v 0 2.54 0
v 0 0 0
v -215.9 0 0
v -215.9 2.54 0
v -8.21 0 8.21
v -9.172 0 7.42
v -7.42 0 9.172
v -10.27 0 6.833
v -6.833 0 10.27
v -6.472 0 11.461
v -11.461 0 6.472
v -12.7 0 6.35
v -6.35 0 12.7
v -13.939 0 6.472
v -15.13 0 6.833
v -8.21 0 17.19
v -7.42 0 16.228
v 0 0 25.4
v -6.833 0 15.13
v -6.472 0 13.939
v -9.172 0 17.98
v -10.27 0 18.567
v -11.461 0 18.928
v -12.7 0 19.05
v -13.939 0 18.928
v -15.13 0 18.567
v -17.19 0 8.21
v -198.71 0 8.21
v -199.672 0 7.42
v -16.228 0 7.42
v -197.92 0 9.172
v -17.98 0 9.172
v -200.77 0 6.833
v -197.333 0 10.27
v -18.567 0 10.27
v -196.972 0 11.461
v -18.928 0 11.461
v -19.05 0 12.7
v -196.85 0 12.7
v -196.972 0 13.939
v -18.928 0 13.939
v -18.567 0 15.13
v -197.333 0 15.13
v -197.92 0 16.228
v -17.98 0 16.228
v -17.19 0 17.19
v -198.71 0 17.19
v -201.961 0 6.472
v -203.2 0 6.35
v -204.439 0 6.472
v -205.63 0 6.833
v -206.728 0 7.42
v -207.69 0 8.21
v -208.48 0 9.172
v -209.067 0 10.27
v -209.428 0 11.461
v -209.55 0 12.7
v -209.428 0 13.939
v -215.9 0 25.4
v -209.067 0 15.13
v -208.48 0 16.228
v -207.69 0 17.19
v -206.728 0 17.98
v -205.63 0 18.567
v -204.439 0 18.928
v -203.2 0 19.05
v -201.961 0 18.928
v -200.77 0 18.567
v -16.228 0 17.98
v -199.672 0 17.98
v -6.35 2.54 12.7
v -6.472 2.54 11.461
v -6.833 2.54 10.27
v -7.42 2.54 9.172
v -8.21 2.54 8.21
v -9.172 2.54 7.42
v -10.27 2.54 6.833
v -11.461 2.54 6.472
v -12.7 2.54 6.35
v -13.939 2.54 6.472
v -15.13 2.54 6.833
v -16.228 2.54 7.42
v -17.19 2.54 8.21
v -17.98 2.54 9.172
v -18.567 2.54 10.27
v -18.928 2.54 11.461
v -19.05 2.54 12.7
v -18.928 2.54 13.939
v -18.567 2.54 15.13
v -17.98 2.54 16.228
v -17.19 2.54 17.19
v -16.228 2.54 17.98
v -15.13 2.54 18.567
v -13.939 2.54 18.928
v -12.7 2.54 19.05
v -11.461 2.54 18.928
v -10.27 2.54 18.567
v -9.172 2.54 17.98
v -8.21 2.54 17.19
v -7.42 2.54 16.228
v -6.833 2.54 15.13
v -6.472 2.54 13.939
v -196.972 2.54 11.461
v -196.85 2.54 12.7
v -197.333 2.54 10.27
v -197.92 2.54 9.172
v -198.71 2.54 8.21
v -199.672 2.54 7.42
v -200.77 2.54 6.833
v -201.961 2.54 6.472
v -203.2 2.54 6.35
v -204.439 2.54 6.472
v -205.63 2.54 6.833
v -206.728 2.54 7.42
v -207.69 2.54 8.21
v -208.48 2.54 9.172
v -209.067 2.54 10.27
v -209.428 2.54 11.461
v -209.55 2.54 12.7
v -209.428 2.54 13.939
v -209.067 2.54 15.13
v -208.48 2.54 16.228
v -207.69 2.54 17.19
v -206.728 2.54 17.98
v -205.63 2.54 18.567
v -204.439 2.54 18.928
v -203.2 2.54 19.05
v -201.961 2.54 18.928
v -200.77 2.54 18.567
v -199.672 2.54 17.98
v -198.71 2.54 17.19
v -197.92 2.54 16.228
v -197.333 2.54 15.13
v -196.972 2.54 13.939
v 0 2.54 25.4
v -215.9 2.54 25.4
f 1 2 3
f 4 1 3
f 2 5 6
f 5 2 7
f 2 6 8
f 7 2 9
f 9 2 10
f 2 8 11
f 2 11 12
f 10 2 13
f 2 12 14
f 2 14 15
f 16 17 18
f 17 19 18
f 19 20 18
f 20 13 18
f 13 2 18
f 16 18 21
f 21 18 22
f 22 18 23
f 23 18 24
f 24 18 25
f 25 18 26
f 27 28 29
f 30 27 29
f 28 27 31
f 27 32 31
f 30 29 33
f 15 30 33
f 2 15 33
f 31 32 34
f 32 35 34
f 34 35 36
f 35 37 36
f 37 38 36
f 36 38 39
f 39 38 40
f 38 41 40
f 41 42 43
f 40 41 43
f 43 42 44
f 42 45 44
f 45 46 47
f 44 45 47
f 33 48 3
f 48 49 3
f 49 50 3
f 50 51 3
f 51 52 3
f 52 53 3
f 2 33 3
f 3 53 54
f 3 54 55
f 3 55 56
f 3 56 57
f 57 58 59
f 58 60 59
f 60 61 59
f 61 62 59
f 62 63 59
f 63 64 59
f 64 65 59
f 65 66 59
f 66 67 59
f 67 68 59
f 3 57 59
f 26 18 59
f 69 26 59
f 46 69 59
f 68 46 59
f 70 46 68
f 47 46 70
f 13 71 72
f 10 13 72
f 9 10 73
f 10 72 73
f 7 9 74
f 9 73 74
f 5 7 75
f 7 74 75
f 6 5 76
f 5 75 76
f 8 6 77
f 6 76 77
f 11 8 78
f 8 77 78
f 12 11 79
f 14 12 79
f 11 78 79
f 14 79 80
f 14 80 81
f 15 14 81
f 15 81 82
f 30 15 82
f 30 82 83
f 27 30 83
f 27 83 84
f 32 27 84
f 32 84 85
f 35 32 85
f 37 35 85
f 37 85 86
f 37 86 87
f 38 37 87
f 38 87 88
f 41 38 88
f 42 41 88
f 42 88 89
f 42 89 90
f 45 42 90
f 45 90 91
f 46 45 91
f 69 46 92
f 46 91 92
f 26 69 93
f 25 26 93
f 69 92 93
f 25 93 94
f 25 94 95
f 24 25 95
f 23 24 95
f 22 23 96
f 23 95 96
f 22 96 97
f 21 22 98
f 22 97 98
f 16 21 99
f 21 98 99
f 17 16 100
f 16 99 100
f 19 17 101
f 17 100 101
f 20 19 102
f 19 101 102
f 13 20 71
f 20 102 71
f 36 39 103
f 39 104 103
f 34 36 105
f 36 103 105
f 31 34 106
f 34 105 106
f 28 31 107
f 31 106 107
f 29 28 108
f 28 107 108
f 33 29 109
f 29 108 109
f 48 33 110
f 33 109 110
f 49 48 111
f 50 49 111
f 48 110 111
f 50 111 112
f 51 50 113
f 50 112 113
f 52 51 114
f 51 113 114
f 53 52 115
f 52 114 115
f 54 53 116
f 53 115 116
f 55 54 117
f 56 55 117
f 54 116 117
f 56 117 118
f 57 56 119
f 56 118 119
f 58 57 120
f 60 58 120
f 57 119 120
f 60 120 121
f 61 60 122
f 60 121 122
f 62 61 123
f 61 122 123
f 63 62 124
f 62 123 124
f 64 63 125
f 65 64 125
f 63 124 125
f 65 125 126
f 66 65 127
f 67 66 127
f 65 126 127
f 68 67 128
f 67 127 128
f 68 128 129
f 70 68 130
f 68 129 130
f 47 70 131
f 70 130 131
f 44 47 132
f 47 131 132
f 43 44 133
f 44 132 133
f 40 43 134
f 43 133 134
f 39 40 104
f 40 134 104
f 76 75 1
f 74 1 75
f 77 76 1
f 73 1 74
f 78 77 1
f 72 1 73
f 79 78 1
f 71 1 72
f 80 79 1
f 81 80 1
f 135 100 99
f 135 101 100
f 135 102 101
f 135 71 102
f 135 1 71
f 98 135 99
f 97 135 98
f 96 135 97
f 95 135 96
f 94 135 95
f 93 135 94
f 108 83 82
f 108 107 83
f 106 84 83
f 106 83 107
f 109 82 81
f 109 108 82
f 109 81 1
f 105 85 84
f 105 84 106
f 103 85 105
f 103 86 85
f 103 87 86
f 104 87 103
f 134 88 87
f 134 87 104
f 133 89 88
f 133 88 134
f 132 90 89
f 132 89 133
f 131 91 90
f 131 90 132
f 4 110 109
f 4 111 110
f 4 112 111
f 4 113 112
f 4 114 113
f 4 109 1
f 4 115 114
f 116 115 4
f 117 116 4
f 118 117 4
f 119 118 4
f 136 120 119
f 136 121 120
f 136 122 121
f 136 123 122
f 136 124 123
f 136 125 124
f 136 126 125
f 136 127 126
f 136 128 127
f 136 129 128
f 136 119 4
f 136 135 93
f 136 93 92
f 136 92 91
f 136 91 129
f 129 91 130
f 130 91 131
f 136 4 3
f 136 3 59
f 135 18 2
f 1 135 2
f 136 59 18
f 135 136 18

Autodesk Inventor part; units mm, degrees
ref_plane "YZ Plane" through (0, 0, 0) normal (1, 0, 0) x (0, 1, 0)
ref_plane "XZ Plane" through (0, 0, 0) normal (0, 1, 0) x (-1, 0, 0)
ref_plane "XY Plane" through (0, 0, 0) normal (0, 0, 1) x (1, 0, 0)
sketch "Sketch1" plane through (0, 0, 0) normal (0, 1, 0) x (-1, 0, 0)
  line L0 (203.2, 25.4) -> (0, 25.4)
  line L1 (0, 25.4) -> (0, 0)
  line L2 (0, 0) -> (203.2, 0)
  line L3 (203.2, 0) -> (203.2, 25.4)
extrude "Extrusion1" add sketch "Sketch1" along normal blind 2.54
sketch "Sketch2" plane through (0, 2.54, 0) normal (0, 1, 0) x (1, 0, 0)
  circle A0 centre (-12.7, -12.7) radius 6.35
  point P0 (0, 0)
  dimension "d2" = 12.7
sketch "Sketch3" plane through (-203.2, 0, 0) normal (-1, 0, 0) x (0, 0, 1)
  line L0 (25.4, 0) -> (0, 0) projected
  line L1 (25.4, 0) -> (25.4, 2.54) projected
  line L2 (0, 2.54) -> (25.4, 2.54) projected
  line L3 (0, 0) -> (0, 2.54) projected
extrude "Extrusion2" add sketch "Sketch3" along normal blind 12.7
sketch "Sketch4" plane through (0, 2.54, 0) normal (0, 1, 0) x (1, 0, 0)
  circle A0 centre (-203.2, -12.7) radius 6.35
  point P0 (0, 0)
  dimension "d5" = 12.7
extrude "Extrusion3" cut sketch "Sketch4" against normal blind 2.54
extrude "Extrusion4" cut sketch "Sketch2" against normal blind 2.54
properties part number "4barBar"
